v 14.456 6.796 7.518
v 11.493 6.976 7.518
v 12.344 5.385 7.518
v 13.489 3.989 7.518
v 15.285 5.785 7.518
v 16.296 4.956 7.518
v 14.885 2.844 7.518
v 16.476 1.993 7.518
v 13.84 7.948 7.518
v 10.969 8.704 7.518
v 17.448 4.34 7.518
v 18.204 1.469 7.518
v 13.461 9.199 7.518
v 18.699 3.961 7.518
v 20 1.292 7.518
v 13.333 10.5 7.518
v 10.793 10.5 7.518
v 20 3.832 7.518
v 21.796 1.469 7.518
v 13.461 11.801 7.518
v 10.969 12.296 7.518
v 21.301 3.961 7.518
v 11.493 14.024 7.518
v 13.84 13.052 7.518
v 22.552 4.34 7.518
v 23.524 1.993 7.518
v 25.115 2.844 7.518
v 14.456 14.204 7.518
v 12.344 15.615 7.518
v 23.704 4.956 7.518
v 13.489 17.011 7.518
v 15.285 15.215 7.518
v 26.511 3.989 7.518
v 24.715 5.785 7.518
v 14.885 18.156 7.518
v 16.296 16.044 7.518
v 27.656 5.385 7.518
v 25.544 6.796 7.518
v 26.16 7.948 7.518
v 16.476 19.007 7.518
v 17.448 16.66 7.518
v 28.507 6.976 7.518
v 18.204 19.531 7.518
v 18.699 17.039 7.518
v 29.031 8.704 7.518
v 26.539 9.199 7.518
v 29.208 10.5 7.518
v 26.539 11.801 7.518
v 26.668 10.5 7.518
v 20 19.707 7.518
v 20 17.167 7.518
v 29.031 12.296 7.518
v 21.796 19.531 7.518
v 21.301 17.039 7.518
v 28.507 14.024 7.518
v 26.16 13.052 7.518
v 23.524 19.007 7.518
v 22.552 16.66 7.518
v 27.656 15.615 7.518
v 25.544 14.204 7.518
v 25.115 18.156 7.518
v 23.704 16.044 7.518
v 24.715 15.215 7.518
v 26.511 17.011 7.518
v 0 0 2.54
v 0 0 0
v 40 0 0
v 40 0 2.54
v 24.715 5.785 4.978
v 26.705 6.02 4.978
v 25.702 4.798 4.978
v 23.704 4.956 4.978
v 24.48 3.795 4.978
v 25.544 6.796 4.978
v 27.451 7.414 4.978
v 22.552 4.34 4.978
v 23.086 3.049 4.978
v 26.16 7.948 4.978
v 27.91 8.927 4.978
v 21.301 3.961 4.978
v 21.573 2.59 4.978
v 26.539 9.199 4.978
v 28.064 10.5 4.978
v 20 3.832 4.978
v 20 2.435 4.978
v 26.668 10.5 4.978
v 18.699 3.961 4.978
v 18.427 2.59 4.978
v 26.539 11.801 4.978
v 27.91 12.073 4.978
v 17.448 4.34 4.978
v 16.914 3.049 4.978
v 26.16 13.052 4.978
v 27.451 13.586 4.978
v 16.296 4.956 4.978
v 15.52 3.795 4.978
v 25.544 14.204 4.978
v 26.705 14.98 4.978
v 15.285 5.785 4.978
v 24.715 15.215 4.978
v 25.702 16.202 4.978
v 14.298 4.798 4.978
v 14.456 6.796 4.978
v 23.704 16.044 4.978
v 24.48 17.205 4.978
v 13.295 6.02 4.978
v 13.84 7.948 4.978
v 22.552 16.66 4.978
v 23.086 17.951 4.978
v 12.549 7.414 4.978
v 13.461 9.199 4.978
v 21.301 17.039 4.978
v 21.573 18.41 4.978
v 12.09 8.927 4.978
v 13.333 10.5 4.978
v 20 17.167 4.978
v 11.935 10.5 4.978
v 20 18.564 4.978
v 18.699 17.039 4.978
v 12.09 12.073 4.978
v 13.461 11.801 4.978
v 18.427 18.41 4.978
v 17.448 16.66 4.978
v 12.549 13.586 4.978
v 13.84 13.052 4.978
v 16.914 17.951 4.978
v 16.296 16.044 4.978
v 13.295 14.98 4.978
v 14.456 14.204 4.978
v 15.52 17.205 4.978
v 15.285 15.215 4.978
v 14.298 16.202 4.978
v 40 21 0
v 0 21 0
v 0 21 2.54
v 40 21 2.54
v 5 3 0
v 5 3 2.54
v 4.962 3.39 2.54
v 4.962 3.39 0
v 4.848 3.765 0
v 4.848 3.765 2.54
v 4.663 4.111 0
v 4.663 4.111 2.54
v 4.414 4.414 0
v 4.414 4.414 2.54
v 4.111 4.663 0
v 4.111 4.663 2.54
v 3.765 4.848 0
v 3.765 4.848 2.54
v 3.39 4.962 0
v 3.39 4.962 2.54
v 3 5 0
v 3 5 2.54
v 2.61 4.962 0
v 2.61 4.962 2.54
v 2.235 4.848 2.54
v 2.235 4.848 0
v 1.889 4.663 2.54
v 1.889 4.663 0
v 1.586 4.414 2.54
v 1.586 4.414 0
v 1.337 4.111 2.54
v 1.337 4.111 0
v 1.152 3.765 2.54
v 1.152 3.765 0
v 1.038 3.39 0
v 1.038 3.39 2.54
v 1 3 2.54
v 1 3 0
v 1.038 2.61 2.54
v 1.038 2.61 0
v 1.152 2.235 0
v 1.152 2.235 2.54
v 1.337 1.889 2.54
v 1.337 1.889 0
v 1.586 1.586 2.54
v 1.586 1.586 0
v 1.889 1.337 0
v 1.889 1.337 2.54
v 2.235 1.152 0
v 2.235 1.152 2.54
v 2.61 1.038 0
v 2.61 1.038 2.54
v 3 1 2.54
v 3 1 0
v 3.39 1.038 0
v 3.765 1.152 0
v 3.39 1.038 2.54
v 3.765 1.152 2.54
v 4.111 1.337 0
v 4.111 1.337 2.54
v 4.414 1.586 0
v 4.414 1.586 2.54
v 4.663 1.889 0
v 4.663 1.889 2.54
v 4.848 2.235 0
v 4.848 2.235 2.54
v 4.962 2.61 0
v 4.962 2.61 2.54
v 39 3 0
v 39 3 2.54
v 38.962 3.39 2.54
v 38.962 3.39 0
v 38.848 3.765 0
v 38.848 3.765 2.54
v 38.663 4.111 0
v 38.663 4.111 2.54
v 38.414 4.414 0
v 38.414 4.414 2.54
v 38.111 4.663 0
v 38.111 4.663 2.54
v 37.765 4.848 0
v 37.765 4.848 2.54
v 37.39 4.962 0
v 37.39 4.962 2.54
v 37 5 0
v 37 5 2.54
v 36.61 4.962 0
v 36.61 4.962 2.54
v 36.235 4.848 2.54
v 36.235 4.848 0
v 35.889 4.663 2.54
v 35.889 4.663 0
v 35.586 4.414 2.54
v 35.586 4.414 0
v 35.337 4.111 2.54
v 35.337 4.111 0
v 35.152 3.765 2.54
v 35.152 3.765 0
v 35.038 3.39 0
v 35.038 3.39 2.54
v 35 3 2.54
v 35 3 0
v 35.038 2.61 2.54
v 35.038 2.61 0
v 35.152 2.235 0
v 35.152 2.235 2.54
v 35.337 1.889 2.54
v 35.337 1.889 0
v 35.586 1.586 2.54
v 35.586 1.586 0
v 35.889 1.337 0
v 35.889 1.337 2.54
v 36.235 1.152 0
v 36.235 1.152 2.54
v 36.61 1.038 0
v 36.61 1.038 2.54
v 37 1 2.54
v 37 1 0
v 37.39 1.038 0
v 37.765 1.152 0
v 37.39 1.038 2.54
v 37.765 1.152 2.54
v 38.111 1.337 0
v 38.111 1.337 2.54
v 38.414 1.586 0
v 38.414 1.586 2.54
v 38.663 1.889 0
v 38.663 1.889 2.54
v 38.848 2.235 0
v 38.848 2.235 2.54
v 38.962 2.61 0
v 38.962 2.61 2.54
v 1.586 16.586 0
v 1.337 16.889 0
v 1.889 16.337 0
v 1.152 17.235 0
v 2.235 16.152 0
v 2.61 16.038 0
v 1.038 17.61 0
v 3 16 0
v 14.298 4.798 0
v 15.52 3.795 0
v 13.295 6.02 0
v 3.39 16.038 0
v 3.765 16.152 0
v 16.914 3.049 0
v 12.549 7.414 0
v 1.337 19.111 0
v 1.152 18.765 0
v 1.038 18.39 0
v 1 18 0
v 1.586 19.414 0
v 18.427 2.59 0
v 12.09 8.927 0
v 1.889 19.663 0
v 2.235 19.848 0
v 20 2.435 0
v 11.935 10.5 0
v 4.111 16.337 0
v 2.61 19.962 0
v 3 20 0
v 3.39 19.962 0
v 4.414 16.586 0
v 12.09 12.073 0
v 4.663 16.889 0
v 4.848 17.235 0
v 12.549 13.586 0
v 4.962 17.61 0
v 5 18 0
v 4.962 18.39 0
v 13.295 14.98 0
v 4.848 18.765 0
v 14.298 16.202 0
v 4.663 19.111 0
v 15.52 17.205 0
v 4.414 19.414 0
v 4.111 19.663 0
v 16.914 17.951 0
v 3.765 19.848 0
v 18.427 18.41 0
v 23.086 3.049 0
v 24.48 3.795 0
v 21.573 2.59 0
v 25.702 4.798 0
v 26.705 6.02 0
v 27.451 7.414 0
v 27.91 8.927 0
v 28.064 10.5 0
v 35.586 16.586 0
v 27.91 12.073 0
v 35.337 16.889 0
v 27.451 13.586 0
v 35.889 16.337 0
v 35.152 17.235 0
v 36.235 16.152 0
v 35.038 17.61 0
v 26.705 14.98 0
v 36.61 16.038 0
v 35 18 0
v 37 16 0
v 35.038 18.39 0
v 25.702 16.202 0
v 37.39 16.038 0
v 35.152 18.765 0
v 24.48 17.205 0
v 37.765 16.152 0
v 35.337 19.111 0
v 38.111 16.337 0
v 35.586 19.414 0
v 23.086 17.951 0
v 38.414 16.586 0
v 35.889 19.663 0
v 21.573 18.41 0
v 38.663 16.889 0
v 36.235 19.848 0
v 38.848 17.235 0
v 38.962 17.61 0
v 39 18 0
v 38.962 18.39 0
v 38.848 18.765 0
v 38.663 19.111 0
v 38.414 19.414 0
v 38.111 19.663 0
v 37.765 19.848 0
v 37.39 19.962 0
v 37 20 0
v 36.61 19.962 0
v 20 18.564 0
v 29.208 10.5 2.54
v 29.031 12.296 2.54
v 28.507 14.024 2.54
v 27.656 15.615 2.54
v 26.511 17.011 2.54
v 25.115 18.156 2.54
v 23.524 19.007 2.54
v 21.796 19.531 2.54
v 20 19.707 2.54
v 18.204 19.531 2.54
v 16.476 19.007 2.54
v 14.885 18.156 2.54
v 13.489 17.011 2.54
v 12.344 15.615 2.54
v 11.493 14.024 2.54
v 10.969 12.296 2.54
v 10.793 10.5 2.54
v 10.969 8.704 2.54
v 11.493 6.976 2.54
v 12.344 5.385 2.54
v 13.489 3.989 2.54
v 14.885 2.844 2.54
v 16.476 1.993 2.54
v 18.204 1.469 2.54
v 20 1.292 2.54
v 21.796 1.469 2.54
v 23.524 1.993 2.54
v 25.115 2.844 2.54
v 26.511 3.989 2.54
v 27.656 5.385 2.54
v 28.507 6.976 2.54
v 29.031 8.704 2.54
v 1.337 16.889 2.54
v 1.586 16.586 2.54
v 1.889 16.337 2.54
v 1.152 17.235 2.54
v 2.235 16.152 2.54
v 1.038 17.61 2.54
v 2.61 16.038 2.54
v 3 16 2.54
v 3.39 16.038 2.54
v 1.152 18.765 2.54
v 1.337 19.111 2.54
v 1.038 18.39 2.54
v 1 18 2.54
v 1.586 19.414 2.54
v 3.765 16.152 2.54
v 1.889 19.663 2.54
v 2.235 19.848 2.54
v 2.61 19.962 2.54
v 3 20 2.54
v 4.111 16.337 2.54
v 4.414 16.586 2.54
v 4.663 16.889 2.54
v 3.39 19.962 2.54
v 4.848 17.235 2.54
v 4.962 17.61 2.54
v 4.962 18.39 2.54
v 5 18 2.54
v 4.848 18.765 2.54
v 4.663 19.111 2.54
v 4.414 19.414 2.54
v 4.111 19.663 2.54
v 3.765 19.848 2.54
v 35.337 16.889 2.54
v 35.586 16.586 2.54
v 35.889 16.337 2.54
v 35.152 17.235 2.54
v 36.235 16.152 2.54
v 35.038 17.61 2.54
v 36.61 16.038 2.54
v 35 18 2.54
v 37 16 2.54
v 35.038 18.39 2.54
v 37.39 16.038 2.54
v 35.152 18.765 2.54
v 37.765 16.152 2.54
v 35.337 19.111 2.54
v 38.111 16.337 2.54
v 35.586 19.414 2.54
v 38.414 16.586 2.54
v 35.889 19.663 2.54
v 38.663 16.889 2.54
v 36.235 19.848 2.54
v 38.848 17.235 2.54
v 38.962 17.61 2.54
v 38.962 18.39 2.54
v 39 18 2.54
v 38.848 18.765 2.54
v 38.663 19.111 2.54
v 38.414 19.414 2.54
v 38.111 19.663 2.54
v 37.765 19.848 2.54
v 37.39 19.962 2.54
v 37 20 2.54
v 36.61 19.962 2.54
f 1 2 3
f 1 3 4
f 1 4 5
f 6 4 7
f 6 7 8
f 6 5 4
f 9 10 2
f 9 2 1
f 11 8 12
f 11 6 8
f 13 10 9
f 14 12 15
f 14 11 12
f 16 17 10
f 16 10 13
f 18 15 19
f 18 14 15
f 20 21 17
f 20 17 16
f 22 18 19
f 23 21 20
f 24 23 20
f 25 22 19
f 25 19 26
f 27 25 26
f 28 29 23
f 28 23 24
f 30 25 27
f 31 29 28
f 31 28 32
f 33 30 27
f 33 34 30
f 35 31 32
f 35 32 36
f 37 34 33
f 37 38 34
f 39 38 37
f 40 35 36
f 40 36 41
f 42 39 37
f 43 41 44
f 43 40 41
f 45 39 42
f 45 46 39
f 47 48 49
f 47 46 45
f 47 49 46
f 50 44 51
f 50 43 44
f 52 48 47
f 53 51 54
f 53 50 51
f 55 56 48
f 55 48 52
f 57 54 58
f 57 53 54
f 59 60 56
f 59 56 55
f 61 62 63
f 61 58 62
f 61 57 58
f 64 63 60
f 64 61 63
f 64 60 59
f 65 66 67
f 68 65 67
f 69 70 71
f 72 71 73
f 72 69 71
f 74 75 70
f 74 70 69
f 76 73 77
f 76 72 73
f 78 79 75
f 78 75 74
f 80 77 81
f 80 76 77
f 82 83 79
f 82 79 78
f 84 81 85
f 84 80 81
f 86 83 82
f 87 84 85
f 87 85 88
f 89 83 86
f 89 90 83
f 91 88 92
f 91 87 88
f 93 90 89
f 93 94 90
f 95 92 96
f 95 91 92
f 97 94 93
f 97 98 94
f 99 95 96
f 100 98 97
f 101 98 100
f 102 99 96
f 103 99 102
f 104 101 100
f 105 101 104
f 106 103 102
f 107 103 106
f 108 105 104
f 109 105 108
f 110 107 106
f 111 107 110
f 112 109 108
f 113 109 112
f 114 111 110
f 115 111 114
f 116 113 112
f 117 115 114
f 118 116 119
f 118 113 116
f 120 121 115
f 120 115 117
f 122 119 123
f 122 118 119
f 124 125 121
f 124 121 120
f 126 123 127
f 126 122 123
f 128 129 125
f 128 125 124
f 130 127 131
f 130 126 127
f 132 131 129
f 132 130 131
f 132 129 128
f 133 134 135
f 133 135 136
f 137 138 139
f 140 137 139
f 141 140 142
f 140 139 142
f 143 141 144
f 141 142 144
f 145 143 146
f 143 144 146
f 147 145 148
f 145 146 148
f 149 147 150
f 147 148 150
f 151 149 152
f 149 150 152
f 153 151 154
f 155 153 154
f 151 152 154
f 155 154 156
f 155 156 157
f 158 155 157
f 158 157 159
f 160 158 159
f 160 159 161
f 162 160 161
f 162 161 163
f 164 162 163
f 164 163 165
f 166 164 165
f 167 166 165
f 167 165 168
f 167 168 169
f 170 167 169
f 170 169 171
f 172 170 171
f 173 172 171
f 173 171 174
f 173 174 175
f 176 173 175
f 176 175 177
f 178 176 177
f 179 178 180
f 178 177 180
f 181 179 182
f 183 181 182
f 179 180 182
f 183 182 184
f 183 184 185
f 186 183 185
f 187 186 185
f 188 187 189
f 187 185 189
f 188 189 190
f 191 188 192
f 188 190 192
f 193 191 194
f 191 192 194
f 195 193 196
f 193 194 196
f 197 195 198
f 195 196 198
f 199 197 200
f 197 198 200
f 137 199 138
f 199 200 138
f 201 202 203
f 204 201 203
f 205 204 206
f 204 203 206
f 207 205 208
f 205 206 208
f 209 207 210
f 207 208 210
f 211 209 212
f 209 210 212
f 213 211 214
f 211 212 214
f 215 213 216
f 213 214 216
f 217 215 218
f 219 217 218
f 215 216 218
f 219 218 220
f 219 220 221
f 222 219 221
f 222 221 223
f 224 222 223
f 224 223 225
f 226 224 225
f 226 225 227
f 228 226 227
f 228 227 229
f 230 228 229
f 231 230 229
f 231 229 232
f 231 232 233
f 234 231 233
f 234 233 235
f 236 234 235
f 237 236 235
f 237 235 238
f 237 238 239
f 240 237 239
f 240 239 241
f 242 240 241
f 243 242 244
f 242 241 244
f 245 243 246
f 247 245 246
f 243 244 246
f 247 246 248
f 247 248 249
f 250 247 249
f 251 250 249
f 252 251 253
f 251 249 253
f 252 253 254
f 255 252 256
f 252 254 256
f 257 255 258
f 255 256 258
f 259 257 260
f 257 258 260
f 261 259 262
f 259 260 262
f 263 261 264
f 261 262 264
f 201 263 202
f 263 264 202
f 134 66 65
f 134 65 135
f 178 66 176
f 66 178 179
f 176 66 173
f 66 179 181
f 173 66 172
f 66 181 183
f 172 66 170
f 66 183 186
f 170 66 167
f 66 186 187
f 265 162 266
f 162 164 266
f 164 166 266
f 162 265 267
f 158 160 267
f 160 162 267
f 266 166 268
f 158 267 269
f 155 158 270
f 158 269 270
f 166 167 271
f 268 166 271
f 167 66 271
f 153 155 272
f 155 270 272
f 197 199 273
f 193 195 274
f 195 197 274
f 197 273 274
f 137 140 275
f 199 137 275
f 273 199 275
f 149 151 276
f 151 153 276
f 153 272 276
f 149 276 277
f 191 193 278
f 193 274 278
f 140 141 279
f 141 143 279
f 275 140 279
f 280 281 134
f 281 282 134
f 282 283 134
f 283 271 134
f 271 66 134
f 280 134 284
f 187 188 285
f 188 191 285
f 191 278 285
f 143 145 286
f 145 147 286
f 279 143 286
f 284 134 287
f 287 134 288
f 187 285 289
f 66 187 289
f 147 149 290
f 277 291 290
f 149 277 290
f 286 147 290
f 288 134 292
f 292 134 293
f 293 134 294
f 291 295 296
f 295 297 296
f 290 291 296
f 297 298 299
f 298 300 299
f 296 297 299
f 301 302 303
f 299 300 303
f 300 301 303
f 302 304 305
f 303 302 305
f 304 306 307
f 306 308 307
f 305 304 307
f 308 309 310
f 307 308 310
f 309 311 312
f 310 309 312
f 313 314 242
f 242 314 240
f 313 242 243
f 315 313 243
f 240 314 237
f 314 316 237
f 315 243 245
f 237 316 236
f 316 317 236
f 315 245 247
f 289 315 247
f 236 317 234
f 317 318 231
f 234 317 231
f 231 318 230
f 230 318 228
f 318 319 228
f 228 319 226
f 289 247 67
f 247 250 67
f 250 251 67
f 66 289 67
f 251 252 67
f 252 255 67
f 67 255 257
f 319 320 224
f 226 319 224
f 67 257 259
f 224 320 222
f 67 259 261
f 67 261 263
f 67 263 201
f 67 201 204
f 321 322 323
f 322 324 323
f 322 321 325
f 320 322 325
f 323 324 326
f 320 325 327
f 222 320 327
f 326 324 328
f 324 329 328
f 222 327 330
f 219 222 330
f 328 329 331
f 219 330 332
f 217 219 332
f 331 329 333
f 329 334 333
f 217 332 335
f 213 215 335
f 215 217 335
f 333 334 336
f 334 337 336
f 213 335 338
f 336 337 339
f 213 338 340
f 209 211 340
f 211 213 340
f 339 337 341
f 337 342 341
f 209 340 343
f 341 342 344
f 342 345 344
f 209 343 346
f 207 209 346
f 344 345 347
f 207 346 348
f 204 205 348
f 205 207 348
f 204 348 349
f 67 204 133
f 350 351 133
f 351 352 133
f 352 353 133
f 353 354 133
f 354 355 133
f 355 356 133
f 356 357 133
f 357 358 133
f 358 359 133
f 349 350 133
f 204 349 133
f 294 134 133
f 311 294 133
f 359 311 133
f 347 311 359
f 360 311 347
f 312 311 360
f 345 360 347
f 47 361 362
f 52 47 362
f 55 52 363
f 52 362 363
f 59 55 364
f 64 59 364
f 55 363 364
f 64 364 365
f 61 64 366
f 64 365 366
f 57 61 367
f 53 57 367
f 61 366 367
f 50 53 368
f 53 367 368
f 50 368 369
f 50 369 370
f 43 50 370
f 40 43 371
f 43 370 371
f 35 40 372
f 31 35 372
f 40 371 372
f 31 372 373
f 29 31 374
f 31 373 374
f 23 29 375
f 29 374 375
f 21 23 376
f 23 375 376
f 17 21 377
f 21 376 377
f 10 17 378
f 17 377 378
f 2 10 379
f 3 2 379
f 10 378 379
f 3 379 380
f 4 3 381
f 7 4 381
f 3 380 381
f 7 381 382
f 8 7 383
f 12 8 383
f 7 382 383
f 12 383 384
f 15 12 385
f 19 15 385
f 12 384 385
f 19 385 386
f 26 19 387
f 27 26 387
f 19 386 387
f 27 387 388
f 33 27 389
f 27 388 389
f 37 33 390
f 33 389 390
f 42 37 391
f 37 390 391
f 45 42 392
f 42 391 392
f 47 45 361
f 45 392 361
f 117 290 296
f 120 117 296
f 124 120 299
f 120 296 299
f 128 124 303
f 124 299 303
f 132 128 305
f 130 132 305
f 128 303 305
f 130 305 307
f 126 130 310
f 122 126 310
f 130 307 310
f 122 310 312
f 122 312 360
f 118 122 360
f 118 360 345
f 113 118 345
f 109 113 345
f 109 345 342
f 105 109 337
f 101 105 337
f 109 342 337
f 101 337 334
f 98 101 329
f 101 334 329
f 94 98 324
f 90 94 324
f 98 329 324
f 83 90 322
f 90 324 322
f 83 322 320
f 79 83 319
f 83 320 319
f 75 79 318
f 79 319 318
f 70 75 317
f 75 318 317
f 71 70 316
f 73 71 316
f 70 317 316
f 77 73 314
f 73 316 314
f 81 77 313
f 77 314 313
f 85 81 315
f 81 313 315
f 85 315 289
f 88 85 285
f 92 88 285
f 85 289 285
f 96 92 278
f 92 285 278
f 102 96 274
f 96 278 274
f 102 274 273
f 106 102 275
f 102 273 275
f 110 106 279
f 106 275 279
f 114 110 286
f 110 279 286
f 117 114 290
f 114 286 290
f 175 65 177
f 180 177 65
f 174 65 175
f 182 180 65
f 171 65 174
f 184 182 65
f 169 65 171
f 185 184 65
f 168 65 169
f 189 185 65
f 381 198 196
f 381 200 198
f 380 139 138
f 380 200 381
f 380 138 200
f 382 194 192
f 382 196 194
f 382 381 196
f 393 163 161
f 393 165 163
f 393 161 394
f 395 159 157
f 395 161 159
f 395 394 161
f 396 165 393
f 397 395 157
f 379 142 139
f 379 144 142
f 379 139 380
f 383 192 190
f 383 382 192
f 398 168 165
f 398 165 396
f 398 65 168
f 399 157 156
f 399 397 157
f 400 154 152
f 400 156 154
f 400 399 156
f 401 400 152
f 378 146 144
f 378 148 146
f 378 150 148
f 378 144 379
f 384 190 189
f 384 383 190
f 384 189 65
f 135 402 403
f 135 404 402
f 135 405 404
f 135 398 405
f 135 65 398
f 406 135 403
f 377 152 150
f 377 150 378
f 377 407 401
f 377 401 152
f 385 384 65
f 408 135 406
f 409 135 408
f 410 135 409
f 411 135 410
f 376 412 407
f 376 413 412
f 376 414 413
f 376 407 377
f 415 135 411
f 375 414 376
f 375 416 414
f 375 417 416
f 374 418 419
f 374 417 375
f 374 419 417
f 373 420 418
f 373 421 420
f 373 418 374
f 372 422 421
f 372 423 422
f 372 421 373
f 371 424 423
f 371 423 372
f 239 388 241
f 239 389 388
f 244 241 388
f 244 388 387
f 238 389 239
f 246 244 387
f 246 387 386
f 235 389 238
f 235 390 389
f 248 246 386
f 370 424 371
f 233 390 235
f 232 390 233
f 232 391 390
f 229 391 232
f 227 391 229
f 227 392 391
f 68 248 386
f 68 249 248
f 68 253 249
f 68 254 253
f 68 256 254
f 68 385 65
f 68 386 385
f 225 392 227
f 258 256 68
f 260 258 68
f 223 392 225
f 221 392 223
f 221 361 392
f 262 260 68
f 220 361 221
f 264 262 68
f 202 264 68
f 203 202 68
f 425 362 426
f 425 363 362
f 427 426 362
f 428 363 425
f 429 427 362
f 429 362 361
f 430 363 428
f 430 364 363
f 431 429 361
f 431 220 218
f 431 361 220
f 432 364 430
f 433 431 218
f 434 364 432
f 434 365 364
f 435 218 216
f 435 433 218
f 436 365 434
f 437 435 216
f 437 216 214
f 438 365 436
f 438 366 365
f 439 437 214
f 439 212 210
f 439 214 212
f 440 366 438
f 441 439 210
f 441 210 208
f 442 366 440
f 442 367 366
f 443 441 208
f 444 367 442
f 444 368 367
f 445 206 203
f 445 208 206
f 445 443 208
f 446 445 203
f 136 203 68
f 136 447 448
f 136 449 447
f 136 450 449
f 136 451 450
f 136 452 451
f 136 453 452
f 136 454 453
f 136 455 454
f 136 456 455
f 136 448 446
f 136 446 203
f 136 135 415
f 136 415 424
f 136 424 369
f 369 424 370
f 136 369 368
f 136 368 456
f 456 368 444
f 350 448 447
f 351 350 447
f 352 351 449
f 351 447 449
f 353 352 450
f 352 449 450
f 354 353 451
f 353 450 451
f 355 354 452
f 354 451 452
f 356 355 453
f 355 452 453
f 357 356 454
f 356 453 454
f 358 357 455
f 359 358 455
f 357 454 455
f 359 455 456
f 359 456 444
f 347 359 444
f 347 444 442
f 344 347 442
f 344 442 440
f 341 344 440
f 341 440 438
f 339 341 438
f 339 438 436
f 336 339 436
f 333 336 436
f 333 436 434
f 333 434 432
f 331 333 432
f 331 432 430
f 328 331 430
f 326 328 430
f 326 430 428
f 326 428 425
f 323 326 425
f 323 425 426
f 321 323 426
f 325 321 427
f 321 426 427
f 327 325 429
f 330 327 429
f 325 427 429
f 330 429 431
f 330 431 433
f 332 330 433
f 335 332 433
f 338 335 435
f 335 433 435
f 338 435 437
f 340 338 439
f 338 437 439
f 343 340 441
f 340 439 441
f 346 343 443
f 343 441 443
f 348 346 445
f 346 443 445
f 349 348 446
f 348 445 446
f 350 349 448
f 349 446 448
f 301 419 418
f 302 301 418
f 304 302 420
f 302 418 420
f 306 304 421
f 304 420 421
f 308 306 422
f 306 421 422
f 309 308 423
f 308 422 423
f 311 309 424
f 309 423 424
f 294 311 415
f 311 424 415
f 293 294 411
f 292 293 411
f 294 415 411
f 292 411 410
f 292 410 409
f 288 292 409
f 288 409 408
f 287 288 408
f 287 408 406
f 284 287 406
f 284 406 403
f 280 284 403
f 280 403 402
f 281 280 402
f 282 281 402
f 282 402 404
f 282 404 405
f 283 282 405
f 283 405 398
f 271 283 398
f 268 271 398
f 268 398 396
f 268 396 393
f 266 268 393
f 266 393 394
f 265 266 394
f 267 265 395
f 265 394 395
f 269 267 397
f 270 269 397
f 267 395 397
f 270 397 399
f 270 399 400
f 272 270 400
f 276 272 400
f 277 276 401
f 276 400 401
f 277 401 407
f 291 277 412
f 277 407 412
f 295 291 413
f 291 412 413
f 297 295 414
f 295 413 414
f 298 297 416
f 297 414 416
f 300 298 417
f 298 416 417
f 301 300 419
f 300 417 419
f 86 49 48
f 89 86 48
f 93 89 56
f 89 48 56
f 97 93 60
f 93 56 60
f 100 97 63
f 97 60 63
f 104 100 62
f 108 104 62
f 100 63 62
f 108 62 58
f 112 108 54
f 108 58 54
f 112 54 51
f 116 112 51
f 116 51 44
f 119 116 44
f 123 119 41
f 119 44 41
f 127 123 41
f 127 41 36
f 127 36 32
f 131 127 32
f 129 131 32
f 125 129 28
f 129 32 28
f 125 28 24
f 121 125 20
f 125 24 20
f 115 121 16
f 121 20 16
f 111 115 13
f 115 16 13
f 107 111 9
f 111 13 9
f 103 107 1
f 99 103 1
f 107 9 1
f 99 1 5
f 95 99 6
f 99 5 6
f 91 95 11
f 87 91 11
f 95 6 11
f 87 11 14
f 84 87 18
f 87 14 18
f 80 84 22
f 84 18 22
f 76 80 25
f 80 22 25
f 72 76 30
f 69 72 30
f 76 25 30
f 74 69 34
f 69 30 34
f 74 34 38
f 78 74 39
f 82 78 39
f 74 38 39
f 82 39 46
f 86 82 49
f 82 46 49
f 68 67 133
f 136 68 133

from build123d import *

# Parameters (mm, degrees)
SKETCH2_W           = 40
SKETCH2_H           = 21
BOSS_EXTRUDE1_DEPTH = 2.54
SKETCH4_R           = 9.2075
BOSS_EXTRUDE2_DEPTH = 4.9784
CUT_EXTRUDE2_START  = 7.5184
SKETCH7_R           = 6.6675
CUT_EXTRUDE2_DEPTH  = 2.54
SKETCH8_R           = 1.999996
CUT_EXTRUDE3_DEPTH  = 3.54
SKETCH10_R          = 1.999996
CUT_EXTRUDE4_DEPTH  = 3.54
SKETCH13_R          = 8.0645
CUT_EXTRUDE5_DEPTH  = 4.9784


with BuildPart() as part:
    # Sketch2 → Boss-Extrude1 (new body)
    with BuildSketch(Plane.XY):
        with Locations((20, 10.5)):
            Rectangle(SKETCH2_W, SKETCH2_H)
    extrude(amount=BOSS_EXTRUDE1_DEPTH)

    # Sketch4 → Boss-Extrude2 (add)
    with BuildSketch(Plane.XY.offset(2.54)):
        with Locations((20.0000108, 10.49999932)):
            Circle(SKETCH4_R)
    extrude(amount=BOSS_EXTRUDE2_DEPTH)

    # Sketch7 → Cut-Extrude2 (cut)
    with BuildSketch(Plane.XY.offset(CUT_EXTRUDE2_START)):
        with Locations((20.0000108, 10.49999932)):
            Circle(SKETCH7_R)
    extrude(amount=-CUT_EXTRUDE2_DEPTH, mode=Mode.SUBTRACT)

    # Sketch8 → Cut-Extrude3 (cut, through all)
    with BuildSketch(Plane.XY.offset(2.54)):
        with Locations((37.000006, 18.000006)):
            Circle(SKETCH8_R)
        with Locations((3.0000156, 18.000006)):
            Circle(SKETCH8_R)
    extrude(amount=-CUT_EXTRUDE3_DEPTH, mode=Mode.SUBTRACT)

    # Sketch10 → Cut-Extrude4 (cut, through all)
    with BuildSketch(Plane.XY.offset(2.54)):
        with Locations((37.000006, 2.999994)):
            Circle(SKETCH10_R)
        with Locations((3.0000156, 2.999994)):
            Circle(SKETCH10_R)
    extrude(amount=-CUT_EXTRUDE4_DEPTH, mode=Mode.SUBTRACT)

    # Sketch13 → Cut-Extrude5 (cut)
    with BuildSketch(Plane(origin=(0, 0, 0), x_dir=(-1, 0, 0), z_dir=(0, 0, -1))):
        with Locations((-19.9999892, 10.49999932)):
            Circle(SKETCH13_R)
    extrude(amount=-CUT_EXTRUDE5_DEPTH, mode=Mode.SUBTRACT)


solid = part.part
